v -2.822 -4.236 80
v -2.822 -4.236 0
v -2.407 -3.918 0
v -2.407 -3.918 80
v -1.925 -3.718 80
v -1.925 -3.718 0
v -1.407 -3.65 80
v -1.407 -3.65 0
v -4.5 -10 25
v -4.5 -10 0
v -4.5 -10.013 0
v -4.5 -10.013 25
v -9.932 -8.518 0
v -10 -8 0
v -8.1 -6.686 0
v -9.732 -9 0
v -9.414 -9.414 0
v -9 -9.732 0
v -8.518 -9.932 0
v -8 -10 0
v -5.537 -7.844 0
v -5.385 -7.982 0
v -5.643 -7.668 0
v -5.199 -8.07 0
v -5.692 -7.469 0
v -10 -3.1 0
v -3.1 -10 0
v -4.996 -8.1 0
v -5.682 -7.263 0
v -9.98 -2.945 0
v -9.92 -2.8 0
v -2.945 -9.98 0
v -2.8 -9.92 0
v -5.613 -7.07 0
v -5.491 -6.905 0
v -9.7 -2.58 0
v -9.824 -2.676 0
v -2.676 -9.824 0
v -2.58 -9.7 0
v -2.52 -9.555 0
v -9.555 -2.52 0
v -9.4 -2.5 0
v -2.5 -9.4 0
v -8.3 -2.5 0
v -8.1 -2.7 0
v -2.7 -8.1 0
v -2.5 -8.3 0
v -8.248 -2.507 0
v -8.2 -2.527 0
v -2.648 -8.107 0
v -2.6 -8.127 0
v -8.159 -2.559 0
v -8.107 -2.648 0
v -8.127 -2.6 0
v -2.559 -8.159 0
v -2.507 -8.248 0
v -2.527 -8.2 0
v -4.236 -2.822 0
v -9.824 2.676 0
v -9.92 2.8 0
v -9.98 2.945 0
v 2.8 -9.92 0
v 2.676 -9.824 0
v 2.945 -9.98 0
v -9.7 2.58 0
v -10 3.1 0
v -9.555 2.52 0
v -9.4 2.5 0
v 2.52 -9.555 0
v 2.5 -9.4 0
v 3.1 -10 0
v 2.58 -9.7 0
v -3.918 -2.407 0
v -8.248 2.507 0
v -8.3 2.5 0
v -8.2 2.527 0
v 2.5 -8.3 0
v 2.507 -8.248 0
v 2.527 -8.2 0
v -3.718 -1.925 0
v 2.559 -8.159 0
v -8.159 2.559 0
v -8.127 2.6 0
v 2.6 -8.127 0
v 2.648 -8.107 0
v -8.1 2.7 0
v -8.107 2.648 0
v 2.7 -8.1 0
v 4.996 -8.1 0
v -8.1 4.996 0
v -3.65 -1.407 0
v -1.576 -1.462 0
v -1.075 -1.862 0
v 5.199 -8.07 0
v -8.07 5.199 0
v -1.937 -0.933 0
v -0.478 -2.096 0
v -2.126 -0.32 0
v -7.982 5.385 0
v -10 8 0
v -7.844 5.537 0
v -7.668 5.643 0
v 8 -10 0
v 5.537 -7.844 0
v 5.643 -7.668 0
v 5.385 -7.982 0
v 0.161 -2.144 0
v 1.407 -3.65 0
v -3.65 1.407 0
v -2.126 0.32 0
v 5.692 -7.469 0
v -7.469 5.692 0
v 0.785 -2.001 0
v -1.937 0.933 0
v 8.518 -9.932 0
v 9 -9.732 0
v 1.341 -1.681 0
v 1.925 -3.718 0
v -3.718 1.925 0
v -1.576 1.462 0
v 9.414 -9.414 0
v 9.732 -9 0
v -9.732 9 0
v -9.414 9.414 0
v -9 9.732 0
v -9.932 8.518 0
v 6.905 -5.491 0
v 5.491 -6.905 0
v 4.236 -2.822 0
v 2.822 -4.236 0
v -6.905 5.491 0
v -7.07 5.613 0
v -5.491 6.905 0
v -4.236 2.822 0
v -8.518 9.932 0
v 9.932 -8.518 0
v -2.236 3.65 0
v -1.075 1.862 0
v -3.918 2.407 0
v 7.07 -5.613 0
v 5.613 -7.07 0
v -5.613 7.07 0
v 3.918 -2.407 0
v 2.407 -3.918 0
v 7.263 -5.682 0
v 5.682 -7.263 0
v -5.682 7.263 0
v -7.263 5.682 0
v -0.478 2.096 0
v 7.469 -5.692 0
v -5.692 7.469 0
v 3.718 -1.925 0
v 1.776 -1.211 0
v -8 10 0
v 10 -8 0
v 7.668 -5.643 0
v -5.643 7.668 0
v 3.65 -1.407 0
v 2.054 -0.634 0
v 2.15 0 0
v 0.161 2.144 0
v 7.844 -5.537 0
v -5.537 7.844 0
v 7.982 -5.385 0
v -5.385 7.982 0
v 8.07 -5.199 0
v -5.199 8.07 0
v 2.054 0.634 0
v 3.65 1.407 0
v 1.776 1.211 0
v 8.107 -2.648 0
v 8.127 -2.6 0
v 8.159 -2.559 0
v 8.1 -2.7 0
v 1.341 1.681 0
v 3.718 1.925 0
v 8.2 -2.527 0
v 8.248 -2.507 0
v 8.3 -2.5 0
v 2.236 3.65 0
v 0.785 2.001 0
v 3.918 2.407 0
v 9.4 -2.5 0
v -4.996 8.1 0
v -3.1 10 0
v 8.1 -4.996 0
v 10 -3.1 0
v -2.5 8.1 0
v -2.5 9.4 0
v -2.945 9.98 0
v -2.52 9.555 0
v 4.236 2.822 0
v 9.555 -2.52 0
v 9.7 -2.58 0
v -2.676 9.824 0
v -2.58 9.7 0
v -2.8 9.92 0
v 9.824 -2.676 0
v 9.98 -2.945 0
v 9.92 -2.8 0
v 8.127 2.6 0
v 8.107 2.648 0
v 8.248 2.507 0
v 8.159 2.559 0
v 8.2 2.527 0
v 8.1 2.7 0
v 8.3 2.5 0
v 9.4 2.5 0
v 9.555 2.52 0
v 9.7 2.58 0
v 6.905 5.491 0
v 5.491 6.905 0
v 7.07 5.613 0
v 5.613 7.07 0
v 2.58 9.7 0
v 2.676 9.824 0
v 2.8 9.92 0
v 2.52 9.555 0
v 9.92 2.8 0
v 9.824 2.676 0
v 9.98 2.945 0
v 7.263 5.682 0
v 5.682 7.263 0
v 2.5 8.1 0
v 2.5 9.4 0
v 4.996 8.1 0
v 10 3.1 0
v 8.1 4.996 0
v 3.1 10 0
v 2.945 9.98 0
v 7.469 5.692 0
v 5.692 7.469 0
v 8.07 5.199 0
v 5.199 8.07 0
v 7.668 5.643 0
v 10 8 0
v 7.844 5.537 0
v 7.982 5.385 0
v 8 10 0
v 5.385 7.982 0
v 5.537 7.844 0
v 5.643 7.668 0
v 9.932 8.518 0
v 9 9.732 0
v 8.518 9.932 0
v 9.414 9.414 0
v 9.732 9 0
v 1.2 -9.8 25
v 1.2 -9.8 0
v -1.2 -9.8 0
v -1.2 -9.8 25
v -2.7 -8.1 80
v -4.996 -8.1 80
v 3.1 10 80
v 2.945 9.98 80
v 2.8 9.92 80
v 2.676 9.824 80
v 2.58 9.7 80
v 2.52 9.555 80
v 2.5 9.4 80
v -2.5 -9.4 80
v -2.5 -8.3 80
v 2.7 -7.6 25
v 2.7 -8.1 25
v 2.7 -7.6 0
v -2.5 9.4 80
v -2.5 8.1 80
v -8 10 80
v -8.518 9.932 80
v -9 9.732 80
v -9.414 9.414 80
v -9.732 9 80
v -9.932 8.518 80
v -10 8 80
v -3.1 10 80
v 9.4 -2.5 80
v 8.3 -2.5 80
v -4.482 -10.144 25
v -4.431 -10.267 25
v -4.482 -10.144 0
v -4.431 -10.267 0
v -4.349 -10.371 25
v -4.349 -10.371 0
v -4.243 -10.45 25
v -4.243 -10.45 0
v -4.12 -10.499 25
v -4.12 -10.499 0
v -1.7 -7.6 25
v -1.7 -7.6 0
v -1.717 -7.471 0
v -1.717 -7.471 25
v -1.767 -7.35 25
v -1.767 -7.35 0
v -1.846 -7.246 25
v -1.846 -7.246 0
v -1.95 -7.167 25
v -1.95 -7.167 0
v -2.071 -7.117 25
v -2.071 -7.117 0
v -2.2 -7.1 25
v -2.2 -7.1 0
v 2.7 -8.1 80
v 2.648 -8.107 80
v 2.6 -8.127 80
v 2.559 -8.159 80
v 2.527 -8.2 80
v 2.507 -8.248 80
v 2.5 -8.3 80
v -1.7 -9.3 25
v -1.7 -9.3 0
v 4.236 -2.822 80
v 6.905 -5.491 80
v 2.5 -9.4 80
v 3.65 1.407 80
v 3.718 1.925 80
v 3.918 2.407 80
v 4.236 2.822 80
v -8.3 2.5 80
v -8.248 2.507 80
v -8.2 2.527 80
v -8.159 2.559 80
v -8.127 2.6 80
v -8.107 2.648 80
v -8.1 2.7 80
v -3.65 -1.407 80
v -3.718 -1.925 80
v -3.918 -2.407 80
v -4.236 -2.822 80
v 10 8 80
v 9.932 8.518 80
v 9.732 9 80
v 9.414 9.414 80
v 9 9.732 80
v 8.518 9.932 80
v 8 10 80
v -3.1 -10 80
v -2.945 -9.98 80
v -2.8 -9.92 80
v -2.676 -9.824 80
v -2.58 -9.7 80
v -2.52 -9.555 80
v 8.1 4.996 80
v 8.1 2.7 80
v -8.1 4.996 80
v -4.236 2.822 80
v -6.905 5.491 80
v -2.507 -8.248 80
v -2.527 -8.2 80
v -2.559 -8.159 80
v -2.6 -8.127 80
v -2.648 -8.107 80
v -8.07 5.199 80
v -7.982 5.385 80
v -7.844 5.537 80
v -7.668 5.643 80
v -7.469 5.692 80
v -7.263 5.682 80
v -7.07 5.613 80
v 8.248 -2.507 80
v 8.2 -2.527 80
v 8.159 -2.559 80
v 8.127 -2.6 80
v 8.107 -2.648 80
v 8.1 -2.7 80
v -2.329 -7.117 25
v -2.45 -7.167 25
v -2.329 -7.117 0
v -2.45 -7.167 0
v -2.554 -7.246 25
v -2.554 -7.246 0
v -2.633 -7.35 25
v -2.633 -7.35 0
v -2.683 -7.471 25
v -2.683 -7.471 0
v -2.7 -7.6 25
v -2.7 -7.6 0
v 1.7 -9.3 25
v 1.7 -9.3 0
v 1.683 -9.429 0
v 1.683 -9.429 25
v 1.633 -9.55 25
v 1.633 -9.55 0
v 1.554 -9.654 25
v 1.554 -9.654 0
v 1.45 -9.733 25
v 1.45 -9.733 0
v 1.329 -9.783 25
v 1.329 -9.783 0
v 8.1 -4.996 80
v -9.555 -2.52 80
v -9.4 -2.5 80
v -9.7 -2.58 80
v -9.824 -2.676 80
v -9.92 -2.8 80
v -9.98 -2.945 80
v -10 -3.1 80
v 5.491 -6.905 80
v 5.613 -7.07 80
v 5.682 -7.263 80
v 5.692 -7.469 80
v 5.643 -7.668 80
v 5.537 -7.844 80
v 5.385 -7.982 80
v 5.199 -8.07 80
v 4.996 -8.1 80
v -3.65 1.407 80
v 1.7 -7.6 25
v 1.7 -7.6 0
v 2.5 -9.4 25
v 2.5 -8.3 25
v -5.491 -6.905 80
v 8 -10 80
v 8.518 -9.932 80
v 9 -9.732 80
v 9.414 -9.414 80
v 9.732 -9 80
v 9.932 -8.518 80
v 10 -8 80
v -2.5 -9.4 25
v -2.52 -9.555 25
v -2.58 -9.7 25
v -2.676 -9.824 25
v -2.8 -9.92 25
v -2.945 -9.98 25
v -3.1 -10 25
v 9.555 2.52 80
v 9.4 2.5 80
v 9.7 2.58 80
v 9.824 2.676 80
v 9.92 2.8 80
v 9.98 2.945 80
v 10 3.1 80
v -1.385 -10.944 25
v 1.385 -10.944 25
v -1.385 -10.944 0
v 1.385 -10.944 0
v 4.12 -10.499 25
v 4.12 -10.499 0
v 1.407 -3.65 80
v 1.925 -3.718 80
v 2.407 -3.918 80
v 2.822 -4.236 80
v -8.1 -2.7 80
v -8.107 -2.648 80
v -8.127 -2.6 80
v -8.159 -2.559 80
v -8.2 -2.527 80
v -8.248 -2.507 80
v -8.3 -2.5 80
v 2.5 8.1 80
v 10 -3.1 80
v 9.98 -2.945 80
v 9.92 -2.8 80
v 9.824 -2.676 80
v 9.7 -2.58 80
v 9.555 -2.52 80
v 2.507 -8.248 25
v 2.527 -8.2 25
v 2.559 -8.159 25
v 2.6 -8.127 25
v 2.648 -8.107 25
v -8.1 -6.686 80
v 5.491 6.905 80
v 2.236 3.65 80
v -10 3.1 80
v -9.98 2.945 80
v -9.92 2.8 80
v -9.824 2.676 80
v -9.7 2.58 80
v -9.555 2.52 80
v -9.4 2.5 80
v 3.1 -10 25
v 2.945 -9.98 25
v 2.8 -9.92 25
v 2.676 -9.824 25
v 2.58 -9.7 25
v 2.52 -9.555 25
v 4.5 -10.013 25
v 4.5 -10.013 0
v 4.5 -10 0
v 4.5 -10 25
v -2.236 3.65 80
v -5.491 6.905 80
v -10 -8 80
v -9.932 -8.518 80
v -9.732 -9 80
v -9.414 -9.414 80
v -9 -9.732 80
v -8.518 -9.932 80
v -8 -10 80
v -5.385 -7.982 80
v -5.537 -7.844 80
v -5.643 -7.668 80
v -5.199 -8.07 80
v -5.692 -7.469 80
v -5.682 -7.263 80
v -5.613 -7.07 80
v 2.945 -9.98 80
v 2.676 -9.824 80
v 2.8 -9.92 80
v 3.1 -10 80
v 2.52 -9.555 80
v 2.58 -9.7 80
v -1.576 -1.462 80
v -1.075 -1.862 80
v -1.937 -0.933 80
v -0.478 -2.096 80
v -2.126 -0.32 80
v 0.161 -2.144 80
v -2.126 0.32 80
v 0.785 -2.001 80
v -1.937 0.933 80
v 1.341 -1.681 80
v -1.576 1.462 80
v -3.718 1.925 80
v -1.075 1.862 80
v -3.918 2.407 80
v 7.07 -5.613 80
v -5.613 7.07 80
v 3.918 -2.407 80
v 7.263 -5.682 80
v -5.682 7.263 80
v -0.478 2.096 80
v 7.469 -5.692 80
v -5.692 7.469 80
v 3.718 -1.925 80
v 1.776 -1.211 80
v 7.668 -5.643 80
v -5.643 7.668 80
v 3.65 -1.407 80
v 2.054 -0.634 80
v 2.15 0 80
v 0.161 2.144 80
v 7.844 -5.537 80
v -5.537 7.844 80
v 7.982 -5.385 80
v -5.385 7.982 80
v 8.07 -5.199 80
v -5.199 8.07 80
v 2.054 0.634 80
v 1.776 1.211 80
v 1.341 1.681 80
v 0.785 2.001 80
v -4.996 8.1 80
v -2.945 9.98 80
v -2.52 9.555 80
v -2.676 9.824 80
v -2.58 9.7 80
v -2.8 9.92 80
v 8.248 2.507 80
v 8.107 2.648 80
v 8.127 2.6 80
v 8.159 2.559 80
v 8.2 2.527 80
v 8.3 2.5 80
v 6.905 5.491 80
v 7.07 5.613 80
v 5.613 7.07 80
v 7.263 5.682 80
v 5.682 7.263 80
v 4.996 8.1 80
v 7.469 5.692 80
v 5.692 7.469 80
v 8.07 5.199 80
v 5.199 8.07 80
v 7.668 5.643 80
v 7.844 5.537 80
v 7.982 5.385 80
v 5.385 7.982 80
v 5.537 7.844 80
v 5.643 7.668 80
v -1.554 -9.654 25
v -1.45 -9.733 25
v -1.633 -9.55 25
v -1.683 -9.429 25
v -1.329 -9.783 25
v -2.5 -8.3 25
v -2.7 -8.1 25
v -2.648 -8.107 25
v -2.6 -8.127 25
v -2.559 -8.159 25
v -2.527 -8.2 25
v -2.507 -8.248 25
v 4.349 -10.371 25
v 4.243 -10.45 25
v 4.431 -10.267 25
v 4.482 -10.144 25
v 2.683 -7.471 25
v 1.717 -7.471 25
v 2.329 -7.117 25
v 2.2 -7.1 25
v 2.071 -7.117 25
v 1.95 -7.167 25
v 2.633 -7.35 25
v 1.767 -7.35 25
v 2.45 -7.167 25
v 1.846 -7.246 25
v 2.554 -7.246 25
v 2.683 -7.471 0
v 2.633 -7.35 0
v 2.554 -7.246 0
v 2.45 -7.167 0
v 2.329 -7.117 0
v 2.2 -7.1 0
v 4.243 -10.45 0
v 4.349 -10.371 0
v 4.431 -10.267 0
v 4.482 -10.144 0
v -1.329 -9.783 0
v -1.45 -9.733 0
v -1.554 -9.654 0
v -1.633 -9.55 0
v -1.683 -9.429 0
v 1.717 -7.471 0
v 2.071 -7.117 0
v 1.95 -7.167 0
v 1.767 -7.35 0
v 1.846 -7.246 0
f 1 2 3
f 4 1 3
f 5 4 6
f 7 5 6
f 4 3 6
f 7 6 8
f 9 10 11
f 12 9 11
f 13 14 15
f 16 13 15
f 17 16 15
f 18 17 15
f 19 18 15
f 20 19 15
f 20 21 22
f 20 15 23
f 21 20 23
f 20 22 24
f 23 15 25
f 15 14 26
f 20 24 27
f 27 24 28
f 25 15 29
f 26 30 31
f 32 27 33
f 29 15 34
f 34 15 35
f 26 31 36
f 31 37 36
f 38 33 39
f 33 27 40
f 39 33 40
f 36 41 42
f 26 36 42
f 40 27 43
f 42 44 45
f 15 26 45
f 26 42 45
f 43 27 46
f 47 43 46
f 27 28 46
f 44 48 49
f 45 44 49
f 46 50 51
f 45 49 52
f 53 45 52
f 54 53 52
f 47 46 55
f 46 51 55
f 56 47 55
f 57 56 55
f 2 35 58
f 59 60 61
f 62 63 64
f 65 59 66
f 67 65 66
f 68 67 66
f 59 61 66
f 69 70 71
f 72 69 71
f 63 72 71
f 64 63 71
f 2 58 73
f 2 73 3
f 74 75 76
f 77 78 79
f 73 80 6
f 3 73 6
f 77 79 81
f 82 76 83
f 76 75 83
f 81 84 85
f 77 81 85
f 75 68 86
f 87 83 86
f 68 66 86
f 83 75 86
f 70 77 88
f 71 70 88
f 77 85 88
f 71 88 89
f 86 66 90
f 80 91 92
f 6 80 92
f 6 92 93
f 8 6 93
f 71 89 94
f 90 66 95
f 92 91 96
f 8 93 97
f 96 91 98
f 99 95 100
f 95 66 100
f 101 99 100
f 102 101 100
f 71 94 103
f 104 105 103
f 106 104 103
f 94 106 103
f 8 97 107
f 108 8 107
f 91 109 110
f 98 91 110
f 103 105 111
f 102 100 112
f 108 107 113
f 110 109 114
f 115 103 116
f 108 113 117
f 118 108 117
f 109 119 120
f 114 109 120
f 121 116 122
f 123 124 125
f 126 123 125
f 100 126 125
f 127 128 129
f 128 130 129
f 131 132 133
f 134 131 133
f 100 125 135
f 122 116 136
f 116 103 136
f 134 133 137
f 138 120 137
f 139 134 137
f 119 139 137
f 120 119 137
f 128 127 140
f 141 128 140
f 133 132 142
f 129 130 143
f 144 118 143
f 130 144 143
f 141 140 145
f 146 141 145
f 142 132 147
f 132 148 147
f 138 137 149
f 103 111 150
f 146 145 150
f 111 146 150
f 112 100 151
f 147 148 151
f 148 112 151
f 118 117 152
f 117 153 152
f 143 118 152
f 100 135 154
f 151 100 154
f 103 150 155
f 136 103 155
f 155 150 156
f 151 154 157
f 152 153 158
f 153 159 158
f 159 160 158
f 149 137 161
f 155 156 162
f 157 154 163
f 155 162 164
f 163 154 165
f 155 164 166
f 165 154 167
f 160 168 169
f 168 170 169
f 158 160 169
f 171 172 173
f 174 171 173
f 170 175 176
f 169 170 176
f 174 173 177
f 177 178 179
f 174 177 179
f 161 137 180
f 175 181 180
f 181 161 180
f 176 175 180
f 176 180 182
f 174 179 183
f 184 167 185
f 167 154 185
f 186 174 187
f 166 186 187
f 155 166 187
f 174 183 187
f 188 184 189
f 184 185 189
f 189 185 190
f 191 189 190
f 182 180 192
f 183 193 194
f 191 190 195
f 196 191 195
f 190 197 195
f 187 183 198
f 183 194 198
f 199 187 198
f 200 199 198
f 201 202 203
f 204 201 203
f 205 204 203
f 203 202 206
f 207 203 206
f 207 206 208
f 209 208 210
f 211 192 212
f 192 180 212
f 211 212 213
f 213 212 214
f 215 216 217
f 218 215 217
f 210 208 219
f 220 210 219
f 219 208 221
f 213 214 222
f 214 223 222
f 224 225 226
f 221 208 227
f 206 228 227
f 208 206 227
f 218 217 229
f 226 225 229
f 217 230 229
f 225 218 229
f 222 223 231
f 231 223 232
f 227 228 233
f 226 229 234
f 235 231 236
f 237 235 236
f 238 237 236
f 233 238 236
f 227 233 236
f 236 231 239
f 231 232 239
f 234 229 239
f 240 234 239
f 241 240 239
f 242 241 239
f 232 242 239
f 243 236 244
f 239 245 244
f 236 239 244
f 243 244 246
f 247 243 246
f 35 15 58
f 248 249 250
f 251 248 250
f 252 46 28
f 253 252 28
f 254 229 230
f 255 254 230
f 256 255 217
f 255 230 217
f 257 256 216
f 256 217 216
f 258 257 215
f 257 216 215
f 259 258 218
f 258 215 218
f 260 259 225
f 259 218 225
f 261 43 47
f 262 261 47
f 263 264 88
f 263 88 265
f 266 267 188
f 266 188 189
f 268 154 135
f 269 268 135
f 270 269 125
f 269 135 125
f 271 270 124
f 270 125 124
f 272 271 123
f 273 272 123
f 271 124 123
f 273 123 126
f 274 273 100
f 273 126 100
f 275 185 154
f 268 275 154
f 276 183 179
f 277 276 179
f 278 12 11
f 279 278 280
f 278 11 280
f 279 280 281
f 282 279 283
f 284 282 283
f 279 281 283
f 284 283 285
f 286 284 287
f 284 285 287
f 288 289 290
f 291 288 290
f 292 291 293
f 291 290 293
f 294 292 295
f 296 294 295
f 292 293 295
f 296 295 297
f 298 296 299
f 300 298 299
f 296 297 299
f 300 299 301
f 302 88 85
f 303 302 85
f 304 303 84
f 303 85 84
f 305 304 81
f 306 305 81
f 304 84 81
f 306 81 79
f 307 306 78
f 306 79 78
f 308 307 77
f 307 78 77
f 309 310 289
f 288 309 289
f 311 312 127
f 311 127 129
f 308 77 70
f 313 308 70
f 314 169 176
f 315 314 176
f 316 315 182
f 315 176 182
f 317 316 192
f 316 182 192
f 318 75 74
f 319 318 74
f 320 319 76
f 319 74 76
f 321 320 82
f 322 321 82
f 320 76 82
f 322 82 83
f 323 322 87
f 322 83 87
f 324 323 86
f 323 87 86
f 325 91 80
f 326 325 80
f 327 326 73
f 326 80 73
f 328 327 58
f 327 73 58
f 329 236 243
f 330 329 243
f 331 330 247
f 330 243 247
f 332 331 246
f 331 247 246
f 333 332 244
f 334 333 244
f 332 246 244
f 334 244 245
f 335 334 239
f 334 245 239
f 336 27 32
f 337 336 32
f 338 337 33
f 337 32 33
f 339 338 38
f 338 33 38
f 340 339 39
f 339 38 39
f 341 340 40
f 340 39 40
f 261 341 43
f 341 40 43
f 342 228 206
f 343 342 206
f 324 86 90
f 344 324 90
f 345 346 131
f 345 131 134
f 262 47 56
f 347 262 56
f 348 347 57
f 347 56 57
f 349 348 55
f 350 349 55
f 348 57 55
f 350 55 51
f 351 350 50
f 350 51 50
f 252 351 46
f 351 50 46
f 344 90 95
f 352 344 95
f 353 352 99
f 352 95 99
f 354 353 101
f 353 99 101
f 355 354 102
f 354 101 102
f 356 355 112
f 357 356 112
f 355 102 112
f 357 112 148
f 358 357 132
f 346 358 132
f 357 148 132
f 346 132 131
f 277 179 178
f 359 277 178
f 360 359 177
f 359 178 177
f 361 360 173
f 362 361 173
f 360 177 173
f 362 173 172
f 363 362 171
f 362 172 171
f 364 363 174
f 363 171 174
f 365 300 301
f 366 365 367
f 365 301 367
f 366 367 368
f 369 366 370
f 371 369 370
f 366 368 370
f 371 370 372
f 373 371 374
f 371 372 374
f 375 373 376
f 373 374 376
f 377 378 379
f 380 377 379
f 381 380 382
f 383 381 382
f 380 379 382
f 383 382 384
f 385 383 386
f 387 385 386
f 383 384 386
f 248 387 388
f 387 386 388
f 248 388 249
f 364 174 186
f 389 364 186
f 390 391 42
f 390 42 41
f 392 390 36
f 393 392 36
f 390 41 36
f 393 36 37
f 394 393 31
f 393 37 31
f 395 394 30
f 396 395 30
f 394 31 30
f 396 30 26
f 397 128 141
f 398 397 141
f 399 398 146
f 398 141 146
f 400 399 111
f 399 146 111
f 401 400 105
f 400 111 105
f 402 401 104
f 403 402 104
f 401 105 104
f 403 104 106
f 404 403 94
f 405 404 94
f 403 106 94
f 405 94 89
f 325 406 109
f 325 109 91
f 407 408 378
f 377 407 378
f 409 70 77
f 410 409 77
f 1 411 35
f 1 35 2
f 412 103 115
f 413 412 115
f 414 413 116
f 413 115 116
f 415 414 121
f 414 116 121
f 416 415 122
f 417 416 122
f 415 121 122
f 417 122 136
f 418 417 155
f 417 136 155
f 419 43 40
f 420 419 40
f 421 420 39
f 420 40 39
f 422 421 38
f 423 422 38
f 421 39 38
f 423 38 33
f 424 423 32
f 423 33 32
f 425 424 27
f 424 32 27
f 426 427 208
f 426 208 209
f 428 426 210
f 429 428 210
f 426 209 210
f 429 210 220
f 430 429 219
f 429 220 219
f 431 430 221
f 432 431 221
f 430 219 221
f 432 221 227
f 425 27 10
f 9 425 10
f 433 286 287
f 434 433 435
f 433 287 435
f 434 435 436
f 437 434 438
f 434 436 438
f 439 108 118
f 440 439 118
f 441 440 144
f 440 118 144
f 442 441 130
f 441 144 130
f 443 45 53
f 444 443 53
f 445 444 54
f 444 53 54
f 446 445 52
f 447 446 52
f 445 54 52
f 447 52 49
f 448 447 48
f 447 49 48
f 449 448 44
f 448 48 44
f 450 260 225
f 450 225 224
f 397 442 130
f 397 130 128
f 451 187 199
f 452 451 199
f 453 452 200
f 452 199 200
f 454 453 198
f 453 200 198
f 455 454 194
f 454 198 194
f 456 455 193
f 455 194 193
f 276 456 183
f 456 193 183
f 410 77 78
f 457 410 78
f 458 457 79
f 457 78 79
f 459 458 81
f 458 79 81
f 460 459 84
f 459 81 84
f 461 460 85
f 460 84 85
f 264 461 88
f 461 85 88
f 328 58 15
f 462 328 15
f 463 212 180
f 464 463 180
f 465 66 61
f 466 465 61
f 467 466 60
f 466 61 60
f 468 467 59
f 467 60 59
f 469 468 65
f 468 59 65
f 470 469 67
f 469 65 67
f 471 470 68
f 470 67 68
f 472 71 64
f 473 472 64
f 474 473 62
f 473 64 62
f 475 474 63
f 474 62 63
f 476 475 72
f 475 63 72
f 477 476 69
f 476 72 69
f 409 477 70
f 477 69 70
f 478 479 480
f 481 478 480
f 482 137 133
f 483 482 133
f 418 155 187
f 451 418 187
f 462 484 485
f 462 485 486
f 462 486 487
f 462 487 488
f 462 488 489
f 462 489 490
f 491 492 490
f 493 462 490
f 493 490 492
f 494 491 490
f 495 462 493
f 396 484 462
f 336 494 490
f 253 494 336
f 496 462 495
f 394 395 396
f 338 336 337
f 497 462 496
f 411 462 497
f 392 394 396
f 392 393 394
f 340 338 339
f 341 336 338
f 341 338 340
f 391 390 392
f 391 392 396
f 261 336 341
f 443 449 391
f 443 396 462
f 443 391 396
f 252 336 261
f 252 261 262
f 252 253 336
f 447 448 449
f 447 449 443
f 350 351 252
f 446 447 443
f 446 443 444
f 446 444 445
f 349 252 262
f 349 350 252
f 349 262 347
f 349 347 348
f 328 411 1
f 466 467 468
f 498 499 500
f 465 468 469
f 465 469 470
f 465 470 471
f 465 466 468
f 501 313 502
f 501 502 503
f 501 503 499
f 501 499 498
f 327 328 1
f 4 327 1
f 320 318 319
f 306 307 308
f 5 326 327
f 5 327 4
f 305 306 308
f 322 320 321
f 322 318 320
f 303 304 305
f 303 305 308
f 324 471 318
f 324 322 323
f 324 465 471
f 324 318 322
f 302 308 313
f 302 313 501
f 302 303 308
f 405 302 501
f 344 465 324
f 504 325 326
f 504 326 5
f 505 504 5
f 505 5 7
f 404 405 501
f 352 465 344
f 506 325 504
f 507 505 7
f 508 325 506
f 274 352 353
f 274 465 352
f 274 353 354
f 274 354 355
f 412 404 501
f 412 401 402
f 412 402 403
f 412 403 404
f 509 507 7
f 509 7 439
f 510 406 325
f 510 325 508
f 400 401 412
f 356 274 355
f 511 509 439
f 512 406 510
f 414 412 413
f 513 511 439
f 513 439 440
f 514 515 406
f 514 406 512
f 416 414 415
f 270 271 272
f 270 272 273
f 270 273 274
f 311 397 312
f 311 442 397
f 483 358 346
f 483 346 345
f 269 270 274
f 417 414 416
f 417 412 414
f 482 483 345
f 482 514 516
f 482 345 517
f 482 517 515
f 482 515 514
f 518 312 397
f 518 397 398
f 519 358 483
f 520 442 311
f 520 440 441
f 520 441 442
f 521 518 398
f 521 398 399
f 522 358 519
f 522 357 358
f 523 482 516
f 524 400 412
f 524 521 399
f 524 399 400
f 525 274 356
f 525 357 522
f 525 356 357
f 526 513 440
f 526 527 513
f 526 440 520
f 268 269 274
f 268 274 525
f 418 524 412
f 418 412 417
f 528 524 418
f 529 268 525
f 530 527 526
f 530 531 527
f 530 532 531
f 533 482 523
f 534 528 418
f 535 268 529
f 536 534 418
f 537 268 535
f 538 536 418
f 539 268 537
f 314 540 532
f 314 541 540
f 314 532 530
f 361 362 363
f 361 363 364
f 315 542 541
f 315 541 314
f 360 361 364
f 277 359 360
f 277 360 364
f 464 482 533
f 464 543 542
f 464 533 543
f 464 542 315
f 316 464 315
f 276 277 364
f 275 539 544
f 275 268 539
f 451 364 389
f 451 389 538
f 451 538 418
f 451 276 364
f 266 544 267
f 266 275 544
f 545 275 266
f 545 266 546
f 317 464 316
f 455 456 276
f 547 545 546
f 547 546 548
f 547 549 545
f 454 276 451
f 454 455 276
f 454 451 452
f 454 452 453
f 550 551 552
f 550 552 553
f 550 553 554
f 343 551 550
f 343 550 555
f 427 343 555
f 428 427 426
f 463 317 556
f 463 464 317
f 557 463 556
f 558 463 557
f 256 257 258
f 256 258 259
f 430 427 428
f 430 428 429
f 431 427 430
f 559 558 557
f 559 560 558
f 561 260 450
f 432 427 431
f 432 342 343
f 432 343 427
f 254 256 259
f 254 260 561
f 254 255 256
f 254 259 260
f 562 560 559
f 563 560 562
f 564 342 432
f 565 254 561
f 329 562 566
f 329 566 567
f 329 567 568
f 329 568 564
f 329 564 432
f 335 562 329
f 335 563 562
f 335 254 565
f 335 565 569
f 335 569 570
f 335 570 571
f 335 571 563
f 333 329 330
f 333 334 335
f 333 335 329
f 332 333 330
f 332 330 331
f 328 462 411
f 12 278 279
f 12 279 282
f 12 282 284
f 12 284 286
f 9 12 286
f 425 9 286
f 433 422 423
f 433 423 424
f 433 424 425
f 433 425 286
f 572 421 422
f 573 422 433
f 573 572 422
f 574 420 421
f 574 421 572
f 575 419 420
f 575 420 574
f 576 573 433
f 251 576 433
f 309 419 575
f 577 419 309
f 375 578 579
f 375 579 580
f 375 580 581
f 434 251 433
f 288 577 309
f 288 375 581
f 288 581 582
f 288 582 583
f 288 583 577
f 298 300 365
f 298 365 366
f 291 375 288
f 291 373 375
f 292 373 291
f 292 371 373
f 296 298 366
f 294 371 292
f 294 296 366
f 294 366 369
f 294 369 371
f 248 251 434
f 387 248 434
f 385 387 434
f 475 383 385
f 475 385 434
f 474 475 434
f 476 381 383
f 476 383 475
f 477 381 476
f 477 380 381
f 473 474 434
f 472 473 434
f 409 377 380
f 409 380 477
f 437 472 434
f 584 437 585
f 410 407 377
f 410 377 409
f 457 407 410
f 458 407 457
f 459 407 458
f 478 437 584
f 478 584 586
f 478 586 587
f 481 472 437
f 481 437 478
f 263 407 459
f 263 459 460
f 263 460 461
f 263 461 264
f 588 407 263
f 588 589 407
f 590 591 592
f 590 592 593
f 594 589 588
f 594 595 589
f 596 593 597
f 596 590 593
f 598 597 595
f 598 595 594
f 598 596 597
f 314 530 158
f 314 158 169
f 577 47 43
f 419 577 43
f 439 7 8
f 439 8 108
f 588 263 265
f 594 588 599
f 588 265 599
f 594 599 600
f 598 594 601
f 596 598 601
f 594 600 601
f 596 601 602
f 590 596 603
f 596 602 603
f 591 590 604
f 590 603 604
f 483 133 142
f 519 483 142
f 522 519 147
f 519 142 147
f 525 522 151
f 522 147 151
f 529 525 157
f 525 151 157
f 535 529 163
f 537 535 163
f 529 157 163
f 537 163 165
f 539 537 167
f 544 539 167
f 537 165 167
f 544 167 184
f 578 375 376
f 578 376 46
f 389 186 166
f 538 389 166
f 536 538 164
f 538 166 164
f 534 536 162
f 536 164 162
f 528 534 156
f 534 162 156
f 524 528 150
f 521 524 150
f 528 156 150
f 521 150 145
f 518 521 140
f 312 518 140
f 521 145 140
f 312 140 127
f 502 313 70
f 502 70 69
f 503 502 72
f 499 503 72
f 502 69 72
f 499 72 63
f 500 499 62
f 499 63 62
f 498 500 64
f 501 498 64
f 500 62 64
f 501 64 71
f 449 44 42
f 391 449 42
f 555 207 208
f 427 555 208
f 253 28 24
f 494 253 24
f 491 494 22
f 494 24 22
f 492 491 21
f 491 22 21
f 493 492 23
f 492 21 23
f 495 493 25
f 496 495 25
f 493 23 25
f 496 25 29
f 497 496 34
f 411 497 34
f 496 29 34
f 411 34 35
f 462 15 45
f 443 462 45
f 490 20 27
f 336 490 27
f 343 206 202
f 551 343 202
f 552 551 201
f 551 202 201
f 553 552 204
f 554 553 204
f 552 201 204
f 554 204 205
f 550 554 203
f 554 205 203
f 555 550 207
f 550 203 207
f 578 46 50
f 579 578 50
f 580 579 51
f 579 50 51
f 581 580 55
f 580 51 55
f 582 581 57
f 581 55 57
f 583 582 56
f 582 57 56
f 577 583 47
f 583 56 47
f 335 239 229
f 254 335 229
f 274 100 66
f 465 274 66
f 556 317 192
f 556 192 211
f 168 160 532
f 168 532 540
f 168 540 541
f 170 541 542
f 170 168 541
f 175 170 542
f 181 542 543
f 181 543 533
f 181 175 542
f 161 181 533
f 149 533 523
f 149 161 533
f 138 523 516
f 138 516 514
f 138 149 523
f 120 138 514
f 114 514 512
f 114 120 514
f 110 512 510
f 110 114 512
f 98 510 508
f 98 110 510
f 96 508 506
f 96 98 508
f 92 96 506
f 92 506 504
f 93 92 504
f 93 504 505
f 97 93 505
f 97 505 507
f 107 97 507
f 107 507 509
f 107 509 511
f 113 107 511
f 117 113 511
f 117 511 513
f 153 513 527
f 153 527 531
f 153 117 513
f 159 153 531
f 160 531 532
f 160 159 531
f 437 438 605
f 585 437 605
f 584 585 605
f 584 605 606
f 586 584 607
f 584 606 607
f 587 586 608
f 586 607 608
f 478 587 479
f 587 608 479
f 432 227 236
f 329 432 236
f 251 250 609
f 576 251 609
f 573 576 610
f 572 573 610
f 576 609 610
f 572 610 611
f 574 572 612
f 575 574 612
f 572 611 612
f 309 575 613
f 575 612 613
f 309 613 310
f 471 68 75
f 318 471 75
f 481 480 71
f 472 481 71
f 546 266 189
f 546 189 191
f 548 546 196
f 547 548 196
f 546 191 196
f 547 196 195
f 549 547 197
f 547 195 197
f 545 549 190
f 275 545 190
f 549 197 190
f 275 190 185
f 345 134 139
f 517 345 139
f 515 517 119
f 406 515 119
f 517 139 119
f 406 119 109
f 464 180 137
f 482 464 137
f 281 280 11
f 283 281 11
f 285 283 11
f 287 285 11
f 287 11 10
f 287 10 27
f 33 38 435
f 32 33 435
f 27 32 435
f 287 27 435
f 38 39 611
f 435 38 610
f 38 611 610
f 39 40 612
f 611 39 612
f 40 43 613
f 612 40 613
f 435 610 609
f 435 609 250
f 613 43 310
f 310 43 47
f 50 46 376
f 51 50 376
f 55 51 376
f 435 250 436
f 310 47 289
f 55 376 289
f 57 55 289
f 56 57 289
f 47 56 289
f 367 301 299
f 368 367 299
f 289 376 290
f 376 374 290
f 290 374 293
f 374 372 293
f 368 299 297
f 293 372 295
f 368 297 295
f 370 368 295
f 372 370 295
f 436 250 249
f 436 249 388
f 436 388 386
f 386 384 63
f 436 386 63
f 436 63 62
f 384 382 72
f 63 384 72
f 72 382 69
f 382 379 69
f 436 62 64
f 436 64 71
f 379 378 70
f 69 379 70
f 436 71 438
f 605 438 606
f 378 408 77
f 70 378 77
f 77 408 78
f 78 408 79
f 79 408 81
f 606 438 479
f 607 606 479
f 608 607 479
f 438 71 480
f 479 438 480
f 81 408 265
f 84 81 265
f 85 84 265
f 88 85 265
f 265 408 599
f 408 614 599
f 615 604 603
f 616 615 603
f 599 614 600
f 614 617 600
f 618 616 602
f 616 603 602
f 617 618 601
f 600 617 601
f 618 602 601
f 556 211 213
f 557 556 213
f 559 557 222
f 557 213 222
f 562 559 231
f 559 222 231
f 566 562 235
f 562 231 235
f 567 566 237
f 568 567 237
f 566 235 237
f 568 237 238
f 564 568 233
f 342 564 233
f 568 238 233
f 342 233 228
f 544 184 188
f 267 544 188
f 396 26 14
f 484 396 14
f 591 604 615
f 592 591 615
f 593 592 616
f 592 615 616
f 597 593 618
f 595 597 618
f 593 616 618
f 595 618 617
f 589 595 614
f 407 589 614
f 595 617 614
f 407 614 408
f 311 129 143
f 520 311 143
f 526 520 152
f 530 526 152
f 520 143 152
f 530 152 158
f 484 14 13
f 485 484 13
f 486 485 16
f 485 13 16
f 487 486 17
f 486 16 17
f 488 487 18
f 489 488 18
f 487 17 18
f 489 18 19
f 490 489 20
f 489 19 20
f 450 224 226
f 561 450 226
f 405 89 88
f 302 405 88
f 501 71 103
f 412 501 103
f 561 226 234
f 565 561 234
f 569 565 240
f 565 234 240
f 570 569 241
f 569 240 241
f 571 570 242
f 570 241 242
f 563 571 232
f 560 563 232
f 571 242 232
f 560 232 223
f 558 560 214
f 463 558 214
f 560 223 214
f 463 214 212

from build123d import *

# Parameters (mm, degrees)
F0_R     = 2.15
F1_DEPTH = 80
F3_DEPTH = 25


with BuildPart() as f1:
    # F0 (on Top) → F1 (new body)
    with BuildSketch(Plane.XY):
        with BuildLine():
            Line((-3.1, 10), (-8, 10))
            ThreePointArc((-8, 10), (-9.414214, 9.414214), (-10, 8))
            Line((-10, 8), (-10, 3.1))
            ThreePointArc((-10, 3.1), (-9.824264, 2.675736), (-9.4, 2.5))
            Line((-9.4, 2.5), (-8.3, 2.5))
            ThreePointArc((-8.3, 2.5), (-8.158579, 2.558579), (-8.1, 2.7))
            Line((-8.1, 2.7), (-8.1, 4.995837))
            ThreePointArc((-8.1, 4.995837), (-7.667878, 5.642553), (-6.905025, 5.490812))
            Line((-6.905025, 5.490812), (-4.235786, 2.821573))
            ThreePointArc((-4.235786, 2.821573), (-3.802241, 2.172726), (-3.65, 1.407359))
            Line((-3.65, 1.407359), (-3.65, -1.407359))
            ThreePointArc((-3.65, -1.407359), (-3.802241, -2.172726), (-4.235786, -2.821573))
            Line((-4.235786, -2.821573), (-8.1, -6.685786))
            Line((-8.1, -6.685786), (-8.1, -2.7))
            ThreePointArc((-8.1, -2.7), (-8.158579, -2.558579), (-8.3, -2.5))
            Line((-8.3, -2.5), (-9.4, -2.5))
            ThreePointArc((-9.4, -2.5), (-9.824264, -2.675736), (-10, -3.1))
            Line((-10, -3.1), (-10, -8))
            ThreePointArc((-10, -8), (-9.414214, -9.414214), (-8, -10))
            Line((-8, -10), (-3.1, -10))
            ThreePointArc((-3.1, -10), (-2.675736, -9.824264), (-2.5, -9.4))
            Line((-2.5, -9.4), (-2.5, -8.3))
            ThreePointArc((-2.5, -8.3), (-2.558579, -8.158579), (-2.7, -8.1))
            Line((-2.7, -8.1), (-4.995837, -8.1))
            ThreePointArc((-4.995837, -8.1), (-5.642553, -7.667878), (-5.490812, -6.905025))
            Line((-5.490812, -6.905025), (-2.821573, -4.235786))
            ThreePointArc((-2.821573, -4.235786), (-2.172726, -3.802241), (-1.407359, -3.65))
            Line((-1.407359, -3.65), (1.407359, -3.65))
            ThreePointArc((1.407359, -3.65), (2.172726, -3.802241), (2.821573, -4.235786))
            Line((2.821573, -4.235786), (5.490812, -6.905025))
            ThreePointArc((5.490812, -6.905025), (5.642553, -7.667878), (4.995837, -8.1))
            Line((4.995837, -8.1), (2.7, -8.1))
            ThreePointArc((2.7, -8.1), (2.558579, -8.158579), (2.5, -8.3))
            Line((2.5, -8.3), (2.5, -9.4))
            ThreePointArc((2.5, -9.4), (2.675736, -9.824264), (3.1, -10))
            Line((3.1, -10), (8, -10))
            ThreePointArc((8, -10), (9.414214, -9.414214), (10, -8))
            Line((10, -8), (10, -3.1))
            ThreePointArc((10, -3.1), (9.824264, -2.675736), (9.4, -2.5))
            Line((9.4, -2.5), (8.3, -2.5))
            ThreePointArc((8.3, -2.5), (8.158579, -2.558579), (8.1, -2.7))
            Line((8.1, -2.7), (8.1, -4.995837))
            ThreePointArc((8.1, -4.995837), (7.667878, -5.642553), (6.905025, -5.490812))
            Line((6.905025, -5.490812), (4.235786, -2.821573))
            ThreePointArc((4.235786, -2.821573), (3.802241, -2.172726), (3.65, -1.407359))
            Line((3.65, -1.407359), (3.65, 1.407359))
            ThreePointArc((3.65, 1.407359), (3.802241, 2.172726), (4.235786, 2.821573))
            Line((4.235786, 2.821573), (6.905025, 5.490812))
            ThreePointArc((6.905025, 5.490812), (7.667878, 5.642553), (8.1, 4.995837))
            Line((8.1, 4.995837), (8.1, 2.7))
            ThreePointArc((8.1, 2.7), (8.158579, 2.558579), (8.3, 2.5))
            Line((8.3, 2.5), (9.4, 2.5))
            ThreePointArc((9.4, 2.5), (9.824264, 2.675736), (10, 3.1))
            Line((10, 3.1), (10, 8))
            ThreePointArc((10, 8), (9.414214, 9.414214), (8, 10))
            Line((8, 10), (3.1, 10))
            ThreePointArc((3.1, 10), (2.675736, 9.824264), (2.5, 9.4))
            Line((2.5, 9.4), (2.5, 8.1))
            Line((2.5, 8.1), (4.995837, 8.1))
            ThreePointArc((4.995837, 8.1), (5.642553, 7.667878), (5.490812, 6.905025))
            Line((5.490812, 6.905025), (2.235786, 3.65))
            Line((2.235786, 3.65), (-2.235786, 3.65))
            Line((-2.235786, 3.65), (-5.490812, 6.905025))
            ThreePointArc((-5.490812, 6.905025), (-5.642553, 7.667878), (-4.995837, 8.1))
            Line((-4.995837, 8.1), (-2.5, 8.1))
            Line((-2.5, 8.1), (-2.5, 9.4))
            ThreePointArc((-2.5, 9.4), (-2.675736, 9.824264), (-3.1, 10))
        make_face()
        Circle(F0_R, mode=Mode.SUBTRACT)
    extrude(amount=F1_DEPTH)


with BuildPart() as f3:
    # F2 (on Top) → F3 (new body)
    with BuildSketch(Plane.XY):
        with BuildLine():
            Line((-2.5, -8.3), (-2.5, -9.4))
            ThreePointArc((-2.5, -9.4), (-2.675736, -9.824264), (-3.1, -10))
            Line((-3.1, -10), (-4.5, -10))
            Line((-4.5, -10), (-4.5, -10.013132))
            ThreePointArc((-4.5, -10.013132), (-4.393681, -10.321377), (-4.11994, -10.498533))
            ThreePointArc((-4.11994, -10.498533), (0, -11), (4.11994, -10.498533))
            ThreePointArc((4.11994, -10.498533), (4.393681, -10.321377), (4.5, -10.013132))
            Line((4.5, -10.013132), (4.5, -10))
            Line((4.5, -10), (3.1, -10))
            ThreePointArc((3.1, -10), (2.675736, -9.824264), (2.5, -9.4))
            Line((2.5, -9.4), (2.5, -8.3))
            ThreePointArc((2.5, -8.3), (2.558579, -8.158579), (2.7, -8.1))
            Line((2.7, -8.1), (2.7, -7.6))
            ThreePointArc((2.7, -7.6), (2.553553, -7.246447), (2.2, -7.1))
            ThreePointArc((2.2, -7.1), (1.846447, -7.246447), (1.7, -7.6))
            Line((1.7, -7.6), (1.7, -9.3))
            ThreePointArc((1.7, -9.3), (1.553553, -9.653553), (1.2, -9.8))
            Line((1.2, -9.8), (-1.2, -9.8))
            ThreePointArc((-1.2, -9.8), (-1.553553, -9.653553), (-1.7, -9.3))
            Line((-1.7, -9.3), (-1.7, -7.6))
            ThreePointArc((-1.7, -7.6), (-1.846447, -7.246447), (-2.2, -7.1))
            ThreePointArc((-2.2, -7.1), (-2.553553, -7.246447), (-2.7, -7.6))
            Line((-2.7, -7.6), (-2.7, -8.1))
            ThreePointArc((-2.7, -8.1), (-2.558579, -8.158579), (-2.5, -8.3))
        make_face()
    extrude(amount=F3_DEPTH)


solid = Compound([f1.part, f3.part])
